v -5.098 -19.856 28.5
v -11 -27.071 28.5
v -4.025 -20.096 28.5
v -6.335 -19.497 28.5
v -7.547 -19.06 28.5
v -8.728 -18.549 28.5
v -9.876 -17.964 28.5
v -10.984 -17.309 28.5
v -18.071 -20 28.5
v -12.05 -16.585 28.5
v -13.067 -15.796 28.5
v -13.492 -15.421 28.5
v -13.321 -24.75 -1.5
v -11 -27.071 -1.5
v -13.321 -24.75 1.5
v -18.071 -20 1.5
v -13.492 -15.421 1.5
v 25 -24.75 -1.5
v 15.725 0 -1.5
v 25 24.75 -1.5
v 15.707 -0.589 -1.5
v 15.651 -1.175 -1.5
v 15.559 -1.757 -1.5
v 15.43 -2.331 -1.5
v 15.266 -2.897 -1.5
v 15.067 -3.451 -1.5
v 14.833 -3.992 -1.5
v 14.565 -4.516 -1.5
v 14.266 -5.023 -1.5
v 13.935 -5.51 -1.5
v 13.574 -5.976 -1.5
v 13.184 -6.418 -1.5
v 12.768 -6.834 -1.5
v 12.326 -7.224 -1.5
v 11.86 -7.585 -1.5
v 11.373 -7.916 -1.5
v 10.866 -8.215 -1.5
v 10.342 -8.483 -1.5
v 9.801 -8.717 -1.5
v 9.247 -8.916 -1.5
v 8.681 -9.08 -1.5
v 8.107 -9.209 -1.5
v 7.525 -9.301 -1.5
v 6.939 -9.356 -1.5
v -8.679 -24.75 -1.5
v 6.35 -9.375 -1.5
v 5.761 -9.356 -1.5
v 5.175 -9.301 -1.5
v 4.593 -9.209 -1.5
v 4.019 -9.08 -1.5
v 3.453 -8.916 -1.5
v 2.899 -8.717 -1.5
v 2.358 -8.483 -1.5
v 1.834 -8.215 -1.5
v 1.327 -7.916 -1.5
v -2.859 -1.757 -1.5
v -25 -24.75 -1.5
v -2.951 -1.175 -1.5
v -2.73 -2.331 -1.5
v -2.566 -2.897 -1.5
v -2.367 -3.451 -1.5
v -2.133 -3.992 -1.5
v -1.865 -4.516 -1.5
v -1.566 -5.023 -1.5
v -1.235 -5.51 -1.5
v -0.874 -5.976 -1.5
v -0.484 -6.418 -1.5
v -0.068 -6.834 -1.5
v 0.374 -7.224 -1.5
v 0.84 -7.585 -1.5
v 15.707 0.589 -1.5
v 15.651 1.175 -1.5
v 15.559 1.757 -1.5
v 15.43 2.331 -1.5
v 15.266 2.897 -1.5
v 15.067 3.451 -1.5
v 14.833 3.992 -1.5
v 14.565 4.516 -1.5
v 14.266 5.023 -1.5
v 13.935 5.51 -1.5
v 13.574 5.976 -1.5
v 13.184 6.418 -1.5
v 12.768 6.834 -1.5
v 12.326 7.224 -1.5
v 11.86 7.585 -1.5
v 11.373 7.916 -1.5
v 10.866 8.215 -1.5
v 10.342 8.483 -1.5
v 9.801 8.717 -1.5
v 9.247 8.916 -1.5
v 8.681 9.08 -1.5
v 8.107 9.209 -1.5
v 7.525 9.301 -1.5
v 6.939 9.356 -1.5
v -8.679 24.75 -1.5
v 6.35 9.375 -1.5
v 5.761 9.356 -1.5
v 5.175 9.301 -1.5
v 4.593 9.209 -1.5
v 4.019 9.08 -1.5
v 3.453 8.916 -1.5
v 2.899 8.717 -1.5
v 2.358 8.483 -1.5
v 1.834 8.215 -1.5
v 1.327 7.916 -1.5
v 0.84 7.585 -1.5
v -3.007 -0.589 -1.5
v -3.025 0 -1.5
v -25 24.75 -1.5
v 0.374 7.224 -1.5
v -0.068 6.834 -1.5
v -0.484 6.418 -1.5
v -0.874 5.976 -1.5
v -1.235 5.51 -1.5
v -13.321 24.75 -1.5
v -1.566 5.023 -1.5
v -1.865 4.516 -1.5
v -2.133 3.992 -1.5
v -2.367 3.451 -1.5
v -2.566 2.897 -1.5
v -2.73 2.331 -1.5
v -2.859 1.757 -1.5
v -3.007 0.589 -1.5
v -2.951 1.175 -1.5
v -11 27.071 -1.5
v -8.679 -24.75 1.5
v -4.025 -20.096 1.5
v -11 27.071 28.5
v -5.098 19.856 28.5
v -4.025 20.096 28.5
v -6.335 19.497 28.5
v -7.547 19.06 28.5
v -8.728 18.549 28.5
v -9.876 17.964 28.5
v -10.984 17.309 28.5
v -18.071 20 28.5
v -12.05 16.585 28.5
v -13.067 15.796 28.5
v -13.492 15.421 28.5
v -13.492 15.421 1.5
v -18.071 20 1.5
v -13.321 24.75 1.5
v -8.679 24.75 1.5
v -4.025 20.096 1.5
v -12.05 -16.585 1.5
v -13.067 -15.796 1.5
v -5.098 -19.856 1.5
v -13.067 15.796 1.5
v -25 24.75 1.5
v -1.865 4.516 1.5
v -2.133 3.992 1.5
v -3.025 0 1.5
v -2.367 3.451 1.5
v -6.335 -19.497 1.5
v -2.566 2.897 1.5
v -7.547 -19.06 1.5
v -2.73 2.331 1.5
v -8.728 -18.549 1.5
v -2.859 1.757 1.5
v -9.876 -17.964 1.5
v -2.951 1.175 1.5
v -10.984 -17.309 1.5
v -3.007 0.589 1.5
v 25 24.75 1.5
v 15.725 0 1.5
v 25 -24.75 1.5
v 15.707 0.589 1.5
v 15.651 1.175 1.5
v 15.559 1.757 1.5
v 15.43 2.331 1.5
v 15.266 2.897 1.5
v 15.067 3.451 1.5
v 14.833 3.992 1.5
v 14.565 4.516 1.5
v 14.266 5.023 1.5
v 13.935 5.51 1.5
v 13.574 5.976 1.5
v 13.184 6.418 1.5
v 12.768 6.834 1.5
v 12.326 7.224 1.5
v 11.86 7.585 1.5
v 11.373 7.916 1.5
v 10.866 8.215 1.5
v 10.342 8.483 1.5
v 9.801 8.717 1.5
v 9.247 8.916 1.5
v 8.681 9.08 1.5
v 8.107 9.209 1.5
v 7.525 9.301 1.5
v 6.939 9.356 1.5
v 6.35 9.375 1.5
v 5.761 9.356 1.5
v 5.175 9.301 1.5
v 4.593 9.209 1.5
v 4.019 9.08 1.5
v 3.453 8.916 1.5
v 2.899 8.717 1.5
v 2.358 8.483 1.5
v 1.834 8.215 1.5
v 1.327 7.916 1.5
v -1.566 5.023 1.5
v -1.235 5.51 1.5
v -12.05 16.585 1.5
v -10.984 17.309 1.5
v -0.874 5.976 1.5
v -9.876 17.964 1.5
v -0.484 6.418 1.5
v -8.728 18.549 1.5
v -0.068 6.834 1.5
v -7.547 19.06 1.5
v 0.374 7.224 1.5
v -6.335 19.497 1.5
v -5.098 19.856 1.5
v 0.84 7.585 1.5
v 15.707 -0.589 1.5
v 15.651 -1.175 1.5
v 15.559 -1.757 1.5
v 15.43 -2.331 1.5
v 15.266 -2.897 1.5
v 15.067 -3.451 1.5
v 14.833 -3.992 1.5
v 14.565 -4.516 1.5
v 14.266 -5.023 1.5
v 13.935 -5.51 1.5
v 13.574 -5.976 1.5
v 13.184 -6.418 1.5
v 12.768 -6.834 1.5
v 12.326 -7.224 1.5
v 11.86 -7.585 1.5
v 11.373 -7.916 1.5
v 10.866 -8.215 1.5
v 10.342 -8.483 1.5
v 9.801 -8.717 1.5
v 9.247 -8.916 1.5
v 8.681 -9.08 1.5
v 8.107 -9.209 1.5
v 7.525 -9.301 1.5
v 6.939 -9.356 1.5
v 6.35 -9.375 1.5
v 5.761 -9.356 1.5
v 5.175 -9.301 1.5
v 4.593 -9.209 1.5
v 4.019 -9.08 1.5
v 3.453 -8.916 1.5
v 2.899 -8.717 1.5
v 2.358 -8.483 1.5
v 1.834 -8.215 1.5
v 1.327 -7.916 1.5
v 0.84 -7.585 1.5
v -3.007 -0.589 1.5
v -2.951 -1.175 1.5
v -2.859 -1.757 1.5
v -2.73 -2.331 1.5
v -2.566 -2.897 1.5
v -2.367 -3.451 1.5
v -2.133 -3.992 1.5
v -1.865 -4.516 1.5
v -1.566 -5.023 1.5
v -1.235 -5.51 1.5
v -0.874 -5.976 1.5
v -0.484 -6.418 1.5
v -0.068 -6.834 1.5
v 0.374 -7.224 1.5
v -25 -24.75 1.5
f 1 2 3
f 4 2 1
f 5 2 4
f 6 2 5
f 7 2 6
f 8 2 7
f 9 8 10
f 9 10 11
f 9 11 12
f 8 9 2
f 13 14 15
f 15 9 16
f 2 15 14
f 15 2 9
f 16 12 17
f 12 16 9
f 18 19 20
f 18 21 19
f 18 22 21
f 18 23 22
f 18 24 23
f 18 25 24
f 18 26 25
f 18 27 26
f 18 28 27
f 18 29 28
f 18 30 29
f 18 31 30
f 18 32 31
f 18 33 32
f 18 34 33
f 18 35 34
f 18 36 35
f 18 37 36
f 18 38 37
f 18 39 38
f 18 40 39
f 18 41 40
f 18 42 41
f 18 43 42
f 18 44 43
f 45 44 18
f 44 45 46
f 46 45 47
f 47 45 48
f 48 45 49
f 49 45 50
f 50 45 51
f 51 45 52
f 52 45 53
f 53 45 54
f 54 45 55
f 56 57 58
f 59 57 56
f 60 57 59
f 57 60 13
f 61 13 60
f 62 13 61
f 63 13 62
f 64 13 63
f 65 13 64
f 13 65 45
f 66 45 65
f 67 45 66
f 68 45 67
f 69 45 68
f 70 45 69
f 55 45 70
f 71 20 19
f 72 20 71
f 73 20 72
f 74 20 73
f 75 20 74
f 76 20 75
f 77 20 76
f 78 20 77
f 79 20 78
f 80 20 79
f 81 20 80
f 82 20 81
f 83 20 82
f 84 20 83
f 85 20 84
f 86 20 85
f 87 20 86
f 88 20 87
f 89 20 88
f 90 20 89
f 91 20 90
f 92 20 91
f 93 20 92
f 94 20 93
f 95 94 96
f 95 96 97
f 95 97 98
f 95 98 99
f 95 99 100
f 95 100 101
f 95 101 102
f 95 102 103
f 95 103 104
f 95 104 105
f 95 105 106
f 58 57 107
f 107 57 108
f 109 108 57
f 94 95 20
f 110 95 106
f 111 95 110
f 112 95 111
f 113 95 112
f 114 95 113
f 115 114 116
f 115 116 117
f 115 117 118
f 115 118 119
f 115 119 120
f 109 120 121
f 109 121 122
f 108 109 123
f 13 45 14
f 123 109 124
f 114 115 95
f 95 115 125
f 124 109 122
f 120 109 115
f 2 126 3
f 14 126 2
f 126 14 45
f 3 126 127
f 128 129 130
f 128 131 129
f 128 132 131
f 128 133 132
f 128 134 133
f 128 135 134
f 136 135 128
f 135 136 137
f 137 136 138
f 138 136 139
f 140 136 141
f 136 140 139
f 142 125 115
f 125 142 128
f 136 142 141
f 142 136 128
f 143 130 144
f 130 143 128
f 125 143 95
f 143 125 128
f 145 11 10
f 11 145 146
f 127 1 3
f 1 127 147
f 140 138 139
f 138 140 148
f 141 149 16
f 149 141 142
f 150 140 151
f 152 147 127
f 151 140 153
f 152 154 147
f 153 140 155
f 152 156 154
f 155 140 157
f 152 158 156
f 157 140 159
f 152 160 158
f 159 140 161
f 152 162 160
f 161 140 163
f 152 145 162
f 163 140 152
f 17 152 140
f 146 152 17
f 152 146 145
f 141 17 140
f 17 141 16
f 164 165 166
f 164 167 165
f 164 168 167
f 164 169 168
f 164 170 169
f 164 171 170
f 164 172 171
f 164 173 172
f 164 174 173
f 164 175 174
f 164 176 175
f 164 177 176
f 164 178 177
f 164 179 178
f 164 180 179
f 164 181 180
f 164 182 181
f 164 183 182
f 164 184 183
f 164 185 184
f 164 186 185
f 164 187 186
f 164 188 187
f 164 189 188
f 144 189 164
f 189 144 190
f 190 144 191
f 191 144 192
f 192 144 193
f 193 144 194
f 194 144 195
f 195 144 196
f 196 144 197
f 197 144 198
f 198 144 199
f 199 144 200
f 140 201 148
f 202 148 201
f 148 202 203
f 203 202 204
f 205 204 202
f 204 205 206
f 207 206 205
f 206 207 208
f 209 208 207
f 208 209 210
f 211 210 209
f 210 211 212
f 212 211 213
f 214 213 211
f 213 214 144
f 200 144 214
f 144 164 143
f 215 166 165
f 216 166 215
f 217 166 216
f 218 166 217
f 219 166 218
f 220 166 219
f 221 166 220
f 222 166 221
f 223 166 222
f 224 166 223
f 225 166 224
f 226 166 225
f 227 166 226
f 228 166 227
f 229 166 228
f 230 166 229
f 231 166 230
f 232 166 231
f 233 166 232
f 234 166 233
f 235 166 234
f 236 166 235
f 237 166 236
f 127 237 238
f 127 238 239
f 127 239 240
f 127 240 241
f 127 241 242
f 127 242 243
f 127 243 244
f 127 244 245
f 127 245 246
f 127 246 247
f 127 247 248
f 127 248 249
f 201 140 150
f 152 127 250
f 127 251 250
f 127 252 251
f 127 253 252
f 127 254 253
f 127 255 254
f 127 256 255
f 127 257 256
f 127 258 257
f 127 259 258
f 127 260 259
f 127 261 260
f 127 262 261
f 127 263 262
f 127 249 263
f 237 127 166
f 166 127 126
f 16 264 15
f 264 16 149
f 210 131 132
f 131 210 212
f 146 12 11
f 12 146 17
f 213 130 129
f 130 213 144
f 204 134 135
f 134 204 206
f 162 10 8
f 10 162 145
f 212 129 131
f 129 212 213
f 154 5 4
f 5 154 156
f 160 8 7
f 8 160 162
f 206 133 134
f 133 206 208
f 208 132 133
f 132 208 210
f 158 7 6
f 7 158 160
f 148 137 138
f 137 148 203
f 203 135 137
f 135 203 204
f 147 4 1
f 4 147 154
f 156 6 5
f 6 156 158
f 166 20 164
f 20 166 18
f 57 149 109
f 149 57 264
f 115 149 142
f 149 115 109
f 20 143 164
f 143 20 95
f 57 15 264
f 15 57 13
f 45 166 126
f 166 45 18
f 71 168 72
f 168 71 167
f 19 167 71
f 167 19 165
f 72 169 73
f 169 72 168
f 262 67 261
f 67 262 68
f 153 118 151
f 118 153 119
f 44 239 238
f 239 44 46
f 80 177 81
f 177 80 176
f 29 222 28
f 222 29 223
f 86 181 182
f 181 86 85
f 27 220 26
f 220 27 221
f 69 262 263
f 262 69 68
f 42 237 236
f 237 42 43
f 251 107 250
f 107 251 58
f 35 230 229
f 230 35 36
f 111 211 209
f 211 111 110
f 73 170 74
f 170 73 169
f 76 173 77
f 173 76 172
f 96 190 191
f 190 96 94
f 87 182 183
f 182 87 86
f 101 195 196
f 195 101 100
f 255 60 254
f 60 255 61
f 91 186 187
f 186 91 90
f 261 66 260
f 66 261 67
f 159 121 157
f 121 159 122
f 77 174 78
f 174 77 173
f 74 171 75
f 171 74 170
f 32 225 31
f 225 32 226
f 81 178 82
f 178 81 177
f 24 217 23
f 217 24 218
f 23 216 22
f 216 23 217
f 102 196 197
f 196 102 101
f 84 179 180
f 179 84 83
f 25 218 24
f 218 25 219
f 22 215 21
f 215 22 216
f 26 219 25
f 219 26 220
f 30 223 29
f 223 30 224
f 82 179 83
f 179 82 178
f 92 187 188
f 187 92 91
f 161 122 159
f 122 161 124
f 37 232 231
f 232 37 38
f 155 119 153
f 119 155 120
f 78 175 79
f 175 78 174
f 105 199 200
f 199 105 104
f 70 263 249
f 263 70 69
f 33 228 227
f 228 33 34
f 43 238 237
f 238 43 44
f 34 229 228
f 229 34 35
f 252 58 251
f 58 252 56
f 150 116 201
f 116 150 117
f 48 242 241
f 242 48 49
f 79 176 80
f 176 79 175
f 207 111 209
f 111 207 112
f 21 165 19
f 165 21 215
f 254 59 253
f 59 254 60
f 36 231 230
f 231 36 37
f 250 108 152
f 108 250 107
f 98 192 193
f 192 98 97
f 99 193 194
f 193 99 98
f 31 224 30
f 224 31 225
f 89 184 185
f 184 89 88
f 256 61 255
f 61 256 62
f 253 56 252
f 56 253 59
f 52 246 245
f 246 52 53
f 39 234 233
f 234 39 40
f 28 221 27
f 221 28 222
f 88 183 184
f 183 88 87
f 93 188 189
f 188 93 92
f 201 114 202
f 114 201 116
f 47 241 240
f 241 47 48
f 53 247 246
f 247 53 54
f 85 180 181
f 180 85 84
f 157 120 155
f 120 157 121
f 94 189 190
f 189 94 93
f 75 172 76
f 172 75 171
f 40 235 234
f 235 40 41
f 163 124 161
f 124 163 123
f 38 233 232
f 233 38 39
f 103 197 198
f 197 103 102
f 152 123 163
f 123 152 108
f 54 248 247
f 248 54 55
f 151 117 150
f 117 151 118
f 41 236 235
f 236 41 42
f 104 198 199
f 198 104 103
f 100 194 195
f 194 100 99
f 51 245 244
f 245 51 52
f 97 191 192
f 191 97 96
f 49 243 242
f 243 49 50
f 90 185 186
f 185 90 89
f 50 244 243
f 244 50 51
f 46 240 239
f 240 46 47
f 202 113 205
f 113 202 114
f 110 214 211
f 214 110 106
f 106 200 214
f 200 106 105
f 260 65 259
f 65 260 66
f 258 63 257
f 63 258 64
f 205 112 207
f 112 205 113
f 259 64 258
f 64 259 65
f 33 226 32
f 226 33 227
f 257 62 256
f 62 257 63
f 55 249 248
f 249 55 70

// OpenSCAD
inch_to_mm = 25.4;

module make_rails(height=1000, buffer=0.5){
    for(i=[-1:2:1])
    translate([-11,20*i,0])
    rotate([0,0,45])
    cube([10+buffer, 10+buffer, height], center=true);
}

module make_tool_holder(offset=0, sight=0){
    
    difference(){
        color("blue")
        translate([0,0,30/2-3/2])
        make_rails(height=30, buffer=0);
            
        color("red")
        translate([0,0,50/2+3/2])
        cylinder(d=41, h=50, center=true, $fn=100);
    }

    difference(){
        cube([50, 50-.5, 3], center=true);

        translate([offset,0,0]){            
            color("red")
            cylinder(d=18.75, h=100, center=true, $fn=100);
            //cylinder(d=28, h=100, center=true, $fn=100);
        }
    }
        if(sight)
        translate([offset,0,0])
        cylinder(d=1, h=1000, center=true, $fn=100);
}

depth_buffer = 0;

module make_bracket(){
    // bracket
    translate([0,0,-50])
    difference(){
        union(){
            translate([-depth_buffer/2-15,0,50/2])
            cube([30+depth_buffer, 60, 100], center=true);

            for(i=[-1:2:1])
            translate([0,25*i,0]){
            difference(){
                scale([1.5,1,1])
                rotate([0,45,0])
                cube([10, 10, 10], center=true);
                
                translate([0,0,-50/2])
                cube([50, 50, 50], center=true);
            }
            }
        }

        // tool cutout
        color("red")
        translate([0,0,0])
        cube([30.1+20, 30.1+20, 100*2], center=true);   
        
        color("red")
        make_rails();
    }
}

if(0)
rotate([0,-90,0])
make_bracket();

if(1)
make_tool_holder(offset=0.5*inch_to_mm/2, sight=0);

// board bb
if(0)
color("gray")
translate([0.5*inch_to_mm/2,0,-100/2-50])
cube([0.5*inch_to_mm, 100, 100], center=true);
